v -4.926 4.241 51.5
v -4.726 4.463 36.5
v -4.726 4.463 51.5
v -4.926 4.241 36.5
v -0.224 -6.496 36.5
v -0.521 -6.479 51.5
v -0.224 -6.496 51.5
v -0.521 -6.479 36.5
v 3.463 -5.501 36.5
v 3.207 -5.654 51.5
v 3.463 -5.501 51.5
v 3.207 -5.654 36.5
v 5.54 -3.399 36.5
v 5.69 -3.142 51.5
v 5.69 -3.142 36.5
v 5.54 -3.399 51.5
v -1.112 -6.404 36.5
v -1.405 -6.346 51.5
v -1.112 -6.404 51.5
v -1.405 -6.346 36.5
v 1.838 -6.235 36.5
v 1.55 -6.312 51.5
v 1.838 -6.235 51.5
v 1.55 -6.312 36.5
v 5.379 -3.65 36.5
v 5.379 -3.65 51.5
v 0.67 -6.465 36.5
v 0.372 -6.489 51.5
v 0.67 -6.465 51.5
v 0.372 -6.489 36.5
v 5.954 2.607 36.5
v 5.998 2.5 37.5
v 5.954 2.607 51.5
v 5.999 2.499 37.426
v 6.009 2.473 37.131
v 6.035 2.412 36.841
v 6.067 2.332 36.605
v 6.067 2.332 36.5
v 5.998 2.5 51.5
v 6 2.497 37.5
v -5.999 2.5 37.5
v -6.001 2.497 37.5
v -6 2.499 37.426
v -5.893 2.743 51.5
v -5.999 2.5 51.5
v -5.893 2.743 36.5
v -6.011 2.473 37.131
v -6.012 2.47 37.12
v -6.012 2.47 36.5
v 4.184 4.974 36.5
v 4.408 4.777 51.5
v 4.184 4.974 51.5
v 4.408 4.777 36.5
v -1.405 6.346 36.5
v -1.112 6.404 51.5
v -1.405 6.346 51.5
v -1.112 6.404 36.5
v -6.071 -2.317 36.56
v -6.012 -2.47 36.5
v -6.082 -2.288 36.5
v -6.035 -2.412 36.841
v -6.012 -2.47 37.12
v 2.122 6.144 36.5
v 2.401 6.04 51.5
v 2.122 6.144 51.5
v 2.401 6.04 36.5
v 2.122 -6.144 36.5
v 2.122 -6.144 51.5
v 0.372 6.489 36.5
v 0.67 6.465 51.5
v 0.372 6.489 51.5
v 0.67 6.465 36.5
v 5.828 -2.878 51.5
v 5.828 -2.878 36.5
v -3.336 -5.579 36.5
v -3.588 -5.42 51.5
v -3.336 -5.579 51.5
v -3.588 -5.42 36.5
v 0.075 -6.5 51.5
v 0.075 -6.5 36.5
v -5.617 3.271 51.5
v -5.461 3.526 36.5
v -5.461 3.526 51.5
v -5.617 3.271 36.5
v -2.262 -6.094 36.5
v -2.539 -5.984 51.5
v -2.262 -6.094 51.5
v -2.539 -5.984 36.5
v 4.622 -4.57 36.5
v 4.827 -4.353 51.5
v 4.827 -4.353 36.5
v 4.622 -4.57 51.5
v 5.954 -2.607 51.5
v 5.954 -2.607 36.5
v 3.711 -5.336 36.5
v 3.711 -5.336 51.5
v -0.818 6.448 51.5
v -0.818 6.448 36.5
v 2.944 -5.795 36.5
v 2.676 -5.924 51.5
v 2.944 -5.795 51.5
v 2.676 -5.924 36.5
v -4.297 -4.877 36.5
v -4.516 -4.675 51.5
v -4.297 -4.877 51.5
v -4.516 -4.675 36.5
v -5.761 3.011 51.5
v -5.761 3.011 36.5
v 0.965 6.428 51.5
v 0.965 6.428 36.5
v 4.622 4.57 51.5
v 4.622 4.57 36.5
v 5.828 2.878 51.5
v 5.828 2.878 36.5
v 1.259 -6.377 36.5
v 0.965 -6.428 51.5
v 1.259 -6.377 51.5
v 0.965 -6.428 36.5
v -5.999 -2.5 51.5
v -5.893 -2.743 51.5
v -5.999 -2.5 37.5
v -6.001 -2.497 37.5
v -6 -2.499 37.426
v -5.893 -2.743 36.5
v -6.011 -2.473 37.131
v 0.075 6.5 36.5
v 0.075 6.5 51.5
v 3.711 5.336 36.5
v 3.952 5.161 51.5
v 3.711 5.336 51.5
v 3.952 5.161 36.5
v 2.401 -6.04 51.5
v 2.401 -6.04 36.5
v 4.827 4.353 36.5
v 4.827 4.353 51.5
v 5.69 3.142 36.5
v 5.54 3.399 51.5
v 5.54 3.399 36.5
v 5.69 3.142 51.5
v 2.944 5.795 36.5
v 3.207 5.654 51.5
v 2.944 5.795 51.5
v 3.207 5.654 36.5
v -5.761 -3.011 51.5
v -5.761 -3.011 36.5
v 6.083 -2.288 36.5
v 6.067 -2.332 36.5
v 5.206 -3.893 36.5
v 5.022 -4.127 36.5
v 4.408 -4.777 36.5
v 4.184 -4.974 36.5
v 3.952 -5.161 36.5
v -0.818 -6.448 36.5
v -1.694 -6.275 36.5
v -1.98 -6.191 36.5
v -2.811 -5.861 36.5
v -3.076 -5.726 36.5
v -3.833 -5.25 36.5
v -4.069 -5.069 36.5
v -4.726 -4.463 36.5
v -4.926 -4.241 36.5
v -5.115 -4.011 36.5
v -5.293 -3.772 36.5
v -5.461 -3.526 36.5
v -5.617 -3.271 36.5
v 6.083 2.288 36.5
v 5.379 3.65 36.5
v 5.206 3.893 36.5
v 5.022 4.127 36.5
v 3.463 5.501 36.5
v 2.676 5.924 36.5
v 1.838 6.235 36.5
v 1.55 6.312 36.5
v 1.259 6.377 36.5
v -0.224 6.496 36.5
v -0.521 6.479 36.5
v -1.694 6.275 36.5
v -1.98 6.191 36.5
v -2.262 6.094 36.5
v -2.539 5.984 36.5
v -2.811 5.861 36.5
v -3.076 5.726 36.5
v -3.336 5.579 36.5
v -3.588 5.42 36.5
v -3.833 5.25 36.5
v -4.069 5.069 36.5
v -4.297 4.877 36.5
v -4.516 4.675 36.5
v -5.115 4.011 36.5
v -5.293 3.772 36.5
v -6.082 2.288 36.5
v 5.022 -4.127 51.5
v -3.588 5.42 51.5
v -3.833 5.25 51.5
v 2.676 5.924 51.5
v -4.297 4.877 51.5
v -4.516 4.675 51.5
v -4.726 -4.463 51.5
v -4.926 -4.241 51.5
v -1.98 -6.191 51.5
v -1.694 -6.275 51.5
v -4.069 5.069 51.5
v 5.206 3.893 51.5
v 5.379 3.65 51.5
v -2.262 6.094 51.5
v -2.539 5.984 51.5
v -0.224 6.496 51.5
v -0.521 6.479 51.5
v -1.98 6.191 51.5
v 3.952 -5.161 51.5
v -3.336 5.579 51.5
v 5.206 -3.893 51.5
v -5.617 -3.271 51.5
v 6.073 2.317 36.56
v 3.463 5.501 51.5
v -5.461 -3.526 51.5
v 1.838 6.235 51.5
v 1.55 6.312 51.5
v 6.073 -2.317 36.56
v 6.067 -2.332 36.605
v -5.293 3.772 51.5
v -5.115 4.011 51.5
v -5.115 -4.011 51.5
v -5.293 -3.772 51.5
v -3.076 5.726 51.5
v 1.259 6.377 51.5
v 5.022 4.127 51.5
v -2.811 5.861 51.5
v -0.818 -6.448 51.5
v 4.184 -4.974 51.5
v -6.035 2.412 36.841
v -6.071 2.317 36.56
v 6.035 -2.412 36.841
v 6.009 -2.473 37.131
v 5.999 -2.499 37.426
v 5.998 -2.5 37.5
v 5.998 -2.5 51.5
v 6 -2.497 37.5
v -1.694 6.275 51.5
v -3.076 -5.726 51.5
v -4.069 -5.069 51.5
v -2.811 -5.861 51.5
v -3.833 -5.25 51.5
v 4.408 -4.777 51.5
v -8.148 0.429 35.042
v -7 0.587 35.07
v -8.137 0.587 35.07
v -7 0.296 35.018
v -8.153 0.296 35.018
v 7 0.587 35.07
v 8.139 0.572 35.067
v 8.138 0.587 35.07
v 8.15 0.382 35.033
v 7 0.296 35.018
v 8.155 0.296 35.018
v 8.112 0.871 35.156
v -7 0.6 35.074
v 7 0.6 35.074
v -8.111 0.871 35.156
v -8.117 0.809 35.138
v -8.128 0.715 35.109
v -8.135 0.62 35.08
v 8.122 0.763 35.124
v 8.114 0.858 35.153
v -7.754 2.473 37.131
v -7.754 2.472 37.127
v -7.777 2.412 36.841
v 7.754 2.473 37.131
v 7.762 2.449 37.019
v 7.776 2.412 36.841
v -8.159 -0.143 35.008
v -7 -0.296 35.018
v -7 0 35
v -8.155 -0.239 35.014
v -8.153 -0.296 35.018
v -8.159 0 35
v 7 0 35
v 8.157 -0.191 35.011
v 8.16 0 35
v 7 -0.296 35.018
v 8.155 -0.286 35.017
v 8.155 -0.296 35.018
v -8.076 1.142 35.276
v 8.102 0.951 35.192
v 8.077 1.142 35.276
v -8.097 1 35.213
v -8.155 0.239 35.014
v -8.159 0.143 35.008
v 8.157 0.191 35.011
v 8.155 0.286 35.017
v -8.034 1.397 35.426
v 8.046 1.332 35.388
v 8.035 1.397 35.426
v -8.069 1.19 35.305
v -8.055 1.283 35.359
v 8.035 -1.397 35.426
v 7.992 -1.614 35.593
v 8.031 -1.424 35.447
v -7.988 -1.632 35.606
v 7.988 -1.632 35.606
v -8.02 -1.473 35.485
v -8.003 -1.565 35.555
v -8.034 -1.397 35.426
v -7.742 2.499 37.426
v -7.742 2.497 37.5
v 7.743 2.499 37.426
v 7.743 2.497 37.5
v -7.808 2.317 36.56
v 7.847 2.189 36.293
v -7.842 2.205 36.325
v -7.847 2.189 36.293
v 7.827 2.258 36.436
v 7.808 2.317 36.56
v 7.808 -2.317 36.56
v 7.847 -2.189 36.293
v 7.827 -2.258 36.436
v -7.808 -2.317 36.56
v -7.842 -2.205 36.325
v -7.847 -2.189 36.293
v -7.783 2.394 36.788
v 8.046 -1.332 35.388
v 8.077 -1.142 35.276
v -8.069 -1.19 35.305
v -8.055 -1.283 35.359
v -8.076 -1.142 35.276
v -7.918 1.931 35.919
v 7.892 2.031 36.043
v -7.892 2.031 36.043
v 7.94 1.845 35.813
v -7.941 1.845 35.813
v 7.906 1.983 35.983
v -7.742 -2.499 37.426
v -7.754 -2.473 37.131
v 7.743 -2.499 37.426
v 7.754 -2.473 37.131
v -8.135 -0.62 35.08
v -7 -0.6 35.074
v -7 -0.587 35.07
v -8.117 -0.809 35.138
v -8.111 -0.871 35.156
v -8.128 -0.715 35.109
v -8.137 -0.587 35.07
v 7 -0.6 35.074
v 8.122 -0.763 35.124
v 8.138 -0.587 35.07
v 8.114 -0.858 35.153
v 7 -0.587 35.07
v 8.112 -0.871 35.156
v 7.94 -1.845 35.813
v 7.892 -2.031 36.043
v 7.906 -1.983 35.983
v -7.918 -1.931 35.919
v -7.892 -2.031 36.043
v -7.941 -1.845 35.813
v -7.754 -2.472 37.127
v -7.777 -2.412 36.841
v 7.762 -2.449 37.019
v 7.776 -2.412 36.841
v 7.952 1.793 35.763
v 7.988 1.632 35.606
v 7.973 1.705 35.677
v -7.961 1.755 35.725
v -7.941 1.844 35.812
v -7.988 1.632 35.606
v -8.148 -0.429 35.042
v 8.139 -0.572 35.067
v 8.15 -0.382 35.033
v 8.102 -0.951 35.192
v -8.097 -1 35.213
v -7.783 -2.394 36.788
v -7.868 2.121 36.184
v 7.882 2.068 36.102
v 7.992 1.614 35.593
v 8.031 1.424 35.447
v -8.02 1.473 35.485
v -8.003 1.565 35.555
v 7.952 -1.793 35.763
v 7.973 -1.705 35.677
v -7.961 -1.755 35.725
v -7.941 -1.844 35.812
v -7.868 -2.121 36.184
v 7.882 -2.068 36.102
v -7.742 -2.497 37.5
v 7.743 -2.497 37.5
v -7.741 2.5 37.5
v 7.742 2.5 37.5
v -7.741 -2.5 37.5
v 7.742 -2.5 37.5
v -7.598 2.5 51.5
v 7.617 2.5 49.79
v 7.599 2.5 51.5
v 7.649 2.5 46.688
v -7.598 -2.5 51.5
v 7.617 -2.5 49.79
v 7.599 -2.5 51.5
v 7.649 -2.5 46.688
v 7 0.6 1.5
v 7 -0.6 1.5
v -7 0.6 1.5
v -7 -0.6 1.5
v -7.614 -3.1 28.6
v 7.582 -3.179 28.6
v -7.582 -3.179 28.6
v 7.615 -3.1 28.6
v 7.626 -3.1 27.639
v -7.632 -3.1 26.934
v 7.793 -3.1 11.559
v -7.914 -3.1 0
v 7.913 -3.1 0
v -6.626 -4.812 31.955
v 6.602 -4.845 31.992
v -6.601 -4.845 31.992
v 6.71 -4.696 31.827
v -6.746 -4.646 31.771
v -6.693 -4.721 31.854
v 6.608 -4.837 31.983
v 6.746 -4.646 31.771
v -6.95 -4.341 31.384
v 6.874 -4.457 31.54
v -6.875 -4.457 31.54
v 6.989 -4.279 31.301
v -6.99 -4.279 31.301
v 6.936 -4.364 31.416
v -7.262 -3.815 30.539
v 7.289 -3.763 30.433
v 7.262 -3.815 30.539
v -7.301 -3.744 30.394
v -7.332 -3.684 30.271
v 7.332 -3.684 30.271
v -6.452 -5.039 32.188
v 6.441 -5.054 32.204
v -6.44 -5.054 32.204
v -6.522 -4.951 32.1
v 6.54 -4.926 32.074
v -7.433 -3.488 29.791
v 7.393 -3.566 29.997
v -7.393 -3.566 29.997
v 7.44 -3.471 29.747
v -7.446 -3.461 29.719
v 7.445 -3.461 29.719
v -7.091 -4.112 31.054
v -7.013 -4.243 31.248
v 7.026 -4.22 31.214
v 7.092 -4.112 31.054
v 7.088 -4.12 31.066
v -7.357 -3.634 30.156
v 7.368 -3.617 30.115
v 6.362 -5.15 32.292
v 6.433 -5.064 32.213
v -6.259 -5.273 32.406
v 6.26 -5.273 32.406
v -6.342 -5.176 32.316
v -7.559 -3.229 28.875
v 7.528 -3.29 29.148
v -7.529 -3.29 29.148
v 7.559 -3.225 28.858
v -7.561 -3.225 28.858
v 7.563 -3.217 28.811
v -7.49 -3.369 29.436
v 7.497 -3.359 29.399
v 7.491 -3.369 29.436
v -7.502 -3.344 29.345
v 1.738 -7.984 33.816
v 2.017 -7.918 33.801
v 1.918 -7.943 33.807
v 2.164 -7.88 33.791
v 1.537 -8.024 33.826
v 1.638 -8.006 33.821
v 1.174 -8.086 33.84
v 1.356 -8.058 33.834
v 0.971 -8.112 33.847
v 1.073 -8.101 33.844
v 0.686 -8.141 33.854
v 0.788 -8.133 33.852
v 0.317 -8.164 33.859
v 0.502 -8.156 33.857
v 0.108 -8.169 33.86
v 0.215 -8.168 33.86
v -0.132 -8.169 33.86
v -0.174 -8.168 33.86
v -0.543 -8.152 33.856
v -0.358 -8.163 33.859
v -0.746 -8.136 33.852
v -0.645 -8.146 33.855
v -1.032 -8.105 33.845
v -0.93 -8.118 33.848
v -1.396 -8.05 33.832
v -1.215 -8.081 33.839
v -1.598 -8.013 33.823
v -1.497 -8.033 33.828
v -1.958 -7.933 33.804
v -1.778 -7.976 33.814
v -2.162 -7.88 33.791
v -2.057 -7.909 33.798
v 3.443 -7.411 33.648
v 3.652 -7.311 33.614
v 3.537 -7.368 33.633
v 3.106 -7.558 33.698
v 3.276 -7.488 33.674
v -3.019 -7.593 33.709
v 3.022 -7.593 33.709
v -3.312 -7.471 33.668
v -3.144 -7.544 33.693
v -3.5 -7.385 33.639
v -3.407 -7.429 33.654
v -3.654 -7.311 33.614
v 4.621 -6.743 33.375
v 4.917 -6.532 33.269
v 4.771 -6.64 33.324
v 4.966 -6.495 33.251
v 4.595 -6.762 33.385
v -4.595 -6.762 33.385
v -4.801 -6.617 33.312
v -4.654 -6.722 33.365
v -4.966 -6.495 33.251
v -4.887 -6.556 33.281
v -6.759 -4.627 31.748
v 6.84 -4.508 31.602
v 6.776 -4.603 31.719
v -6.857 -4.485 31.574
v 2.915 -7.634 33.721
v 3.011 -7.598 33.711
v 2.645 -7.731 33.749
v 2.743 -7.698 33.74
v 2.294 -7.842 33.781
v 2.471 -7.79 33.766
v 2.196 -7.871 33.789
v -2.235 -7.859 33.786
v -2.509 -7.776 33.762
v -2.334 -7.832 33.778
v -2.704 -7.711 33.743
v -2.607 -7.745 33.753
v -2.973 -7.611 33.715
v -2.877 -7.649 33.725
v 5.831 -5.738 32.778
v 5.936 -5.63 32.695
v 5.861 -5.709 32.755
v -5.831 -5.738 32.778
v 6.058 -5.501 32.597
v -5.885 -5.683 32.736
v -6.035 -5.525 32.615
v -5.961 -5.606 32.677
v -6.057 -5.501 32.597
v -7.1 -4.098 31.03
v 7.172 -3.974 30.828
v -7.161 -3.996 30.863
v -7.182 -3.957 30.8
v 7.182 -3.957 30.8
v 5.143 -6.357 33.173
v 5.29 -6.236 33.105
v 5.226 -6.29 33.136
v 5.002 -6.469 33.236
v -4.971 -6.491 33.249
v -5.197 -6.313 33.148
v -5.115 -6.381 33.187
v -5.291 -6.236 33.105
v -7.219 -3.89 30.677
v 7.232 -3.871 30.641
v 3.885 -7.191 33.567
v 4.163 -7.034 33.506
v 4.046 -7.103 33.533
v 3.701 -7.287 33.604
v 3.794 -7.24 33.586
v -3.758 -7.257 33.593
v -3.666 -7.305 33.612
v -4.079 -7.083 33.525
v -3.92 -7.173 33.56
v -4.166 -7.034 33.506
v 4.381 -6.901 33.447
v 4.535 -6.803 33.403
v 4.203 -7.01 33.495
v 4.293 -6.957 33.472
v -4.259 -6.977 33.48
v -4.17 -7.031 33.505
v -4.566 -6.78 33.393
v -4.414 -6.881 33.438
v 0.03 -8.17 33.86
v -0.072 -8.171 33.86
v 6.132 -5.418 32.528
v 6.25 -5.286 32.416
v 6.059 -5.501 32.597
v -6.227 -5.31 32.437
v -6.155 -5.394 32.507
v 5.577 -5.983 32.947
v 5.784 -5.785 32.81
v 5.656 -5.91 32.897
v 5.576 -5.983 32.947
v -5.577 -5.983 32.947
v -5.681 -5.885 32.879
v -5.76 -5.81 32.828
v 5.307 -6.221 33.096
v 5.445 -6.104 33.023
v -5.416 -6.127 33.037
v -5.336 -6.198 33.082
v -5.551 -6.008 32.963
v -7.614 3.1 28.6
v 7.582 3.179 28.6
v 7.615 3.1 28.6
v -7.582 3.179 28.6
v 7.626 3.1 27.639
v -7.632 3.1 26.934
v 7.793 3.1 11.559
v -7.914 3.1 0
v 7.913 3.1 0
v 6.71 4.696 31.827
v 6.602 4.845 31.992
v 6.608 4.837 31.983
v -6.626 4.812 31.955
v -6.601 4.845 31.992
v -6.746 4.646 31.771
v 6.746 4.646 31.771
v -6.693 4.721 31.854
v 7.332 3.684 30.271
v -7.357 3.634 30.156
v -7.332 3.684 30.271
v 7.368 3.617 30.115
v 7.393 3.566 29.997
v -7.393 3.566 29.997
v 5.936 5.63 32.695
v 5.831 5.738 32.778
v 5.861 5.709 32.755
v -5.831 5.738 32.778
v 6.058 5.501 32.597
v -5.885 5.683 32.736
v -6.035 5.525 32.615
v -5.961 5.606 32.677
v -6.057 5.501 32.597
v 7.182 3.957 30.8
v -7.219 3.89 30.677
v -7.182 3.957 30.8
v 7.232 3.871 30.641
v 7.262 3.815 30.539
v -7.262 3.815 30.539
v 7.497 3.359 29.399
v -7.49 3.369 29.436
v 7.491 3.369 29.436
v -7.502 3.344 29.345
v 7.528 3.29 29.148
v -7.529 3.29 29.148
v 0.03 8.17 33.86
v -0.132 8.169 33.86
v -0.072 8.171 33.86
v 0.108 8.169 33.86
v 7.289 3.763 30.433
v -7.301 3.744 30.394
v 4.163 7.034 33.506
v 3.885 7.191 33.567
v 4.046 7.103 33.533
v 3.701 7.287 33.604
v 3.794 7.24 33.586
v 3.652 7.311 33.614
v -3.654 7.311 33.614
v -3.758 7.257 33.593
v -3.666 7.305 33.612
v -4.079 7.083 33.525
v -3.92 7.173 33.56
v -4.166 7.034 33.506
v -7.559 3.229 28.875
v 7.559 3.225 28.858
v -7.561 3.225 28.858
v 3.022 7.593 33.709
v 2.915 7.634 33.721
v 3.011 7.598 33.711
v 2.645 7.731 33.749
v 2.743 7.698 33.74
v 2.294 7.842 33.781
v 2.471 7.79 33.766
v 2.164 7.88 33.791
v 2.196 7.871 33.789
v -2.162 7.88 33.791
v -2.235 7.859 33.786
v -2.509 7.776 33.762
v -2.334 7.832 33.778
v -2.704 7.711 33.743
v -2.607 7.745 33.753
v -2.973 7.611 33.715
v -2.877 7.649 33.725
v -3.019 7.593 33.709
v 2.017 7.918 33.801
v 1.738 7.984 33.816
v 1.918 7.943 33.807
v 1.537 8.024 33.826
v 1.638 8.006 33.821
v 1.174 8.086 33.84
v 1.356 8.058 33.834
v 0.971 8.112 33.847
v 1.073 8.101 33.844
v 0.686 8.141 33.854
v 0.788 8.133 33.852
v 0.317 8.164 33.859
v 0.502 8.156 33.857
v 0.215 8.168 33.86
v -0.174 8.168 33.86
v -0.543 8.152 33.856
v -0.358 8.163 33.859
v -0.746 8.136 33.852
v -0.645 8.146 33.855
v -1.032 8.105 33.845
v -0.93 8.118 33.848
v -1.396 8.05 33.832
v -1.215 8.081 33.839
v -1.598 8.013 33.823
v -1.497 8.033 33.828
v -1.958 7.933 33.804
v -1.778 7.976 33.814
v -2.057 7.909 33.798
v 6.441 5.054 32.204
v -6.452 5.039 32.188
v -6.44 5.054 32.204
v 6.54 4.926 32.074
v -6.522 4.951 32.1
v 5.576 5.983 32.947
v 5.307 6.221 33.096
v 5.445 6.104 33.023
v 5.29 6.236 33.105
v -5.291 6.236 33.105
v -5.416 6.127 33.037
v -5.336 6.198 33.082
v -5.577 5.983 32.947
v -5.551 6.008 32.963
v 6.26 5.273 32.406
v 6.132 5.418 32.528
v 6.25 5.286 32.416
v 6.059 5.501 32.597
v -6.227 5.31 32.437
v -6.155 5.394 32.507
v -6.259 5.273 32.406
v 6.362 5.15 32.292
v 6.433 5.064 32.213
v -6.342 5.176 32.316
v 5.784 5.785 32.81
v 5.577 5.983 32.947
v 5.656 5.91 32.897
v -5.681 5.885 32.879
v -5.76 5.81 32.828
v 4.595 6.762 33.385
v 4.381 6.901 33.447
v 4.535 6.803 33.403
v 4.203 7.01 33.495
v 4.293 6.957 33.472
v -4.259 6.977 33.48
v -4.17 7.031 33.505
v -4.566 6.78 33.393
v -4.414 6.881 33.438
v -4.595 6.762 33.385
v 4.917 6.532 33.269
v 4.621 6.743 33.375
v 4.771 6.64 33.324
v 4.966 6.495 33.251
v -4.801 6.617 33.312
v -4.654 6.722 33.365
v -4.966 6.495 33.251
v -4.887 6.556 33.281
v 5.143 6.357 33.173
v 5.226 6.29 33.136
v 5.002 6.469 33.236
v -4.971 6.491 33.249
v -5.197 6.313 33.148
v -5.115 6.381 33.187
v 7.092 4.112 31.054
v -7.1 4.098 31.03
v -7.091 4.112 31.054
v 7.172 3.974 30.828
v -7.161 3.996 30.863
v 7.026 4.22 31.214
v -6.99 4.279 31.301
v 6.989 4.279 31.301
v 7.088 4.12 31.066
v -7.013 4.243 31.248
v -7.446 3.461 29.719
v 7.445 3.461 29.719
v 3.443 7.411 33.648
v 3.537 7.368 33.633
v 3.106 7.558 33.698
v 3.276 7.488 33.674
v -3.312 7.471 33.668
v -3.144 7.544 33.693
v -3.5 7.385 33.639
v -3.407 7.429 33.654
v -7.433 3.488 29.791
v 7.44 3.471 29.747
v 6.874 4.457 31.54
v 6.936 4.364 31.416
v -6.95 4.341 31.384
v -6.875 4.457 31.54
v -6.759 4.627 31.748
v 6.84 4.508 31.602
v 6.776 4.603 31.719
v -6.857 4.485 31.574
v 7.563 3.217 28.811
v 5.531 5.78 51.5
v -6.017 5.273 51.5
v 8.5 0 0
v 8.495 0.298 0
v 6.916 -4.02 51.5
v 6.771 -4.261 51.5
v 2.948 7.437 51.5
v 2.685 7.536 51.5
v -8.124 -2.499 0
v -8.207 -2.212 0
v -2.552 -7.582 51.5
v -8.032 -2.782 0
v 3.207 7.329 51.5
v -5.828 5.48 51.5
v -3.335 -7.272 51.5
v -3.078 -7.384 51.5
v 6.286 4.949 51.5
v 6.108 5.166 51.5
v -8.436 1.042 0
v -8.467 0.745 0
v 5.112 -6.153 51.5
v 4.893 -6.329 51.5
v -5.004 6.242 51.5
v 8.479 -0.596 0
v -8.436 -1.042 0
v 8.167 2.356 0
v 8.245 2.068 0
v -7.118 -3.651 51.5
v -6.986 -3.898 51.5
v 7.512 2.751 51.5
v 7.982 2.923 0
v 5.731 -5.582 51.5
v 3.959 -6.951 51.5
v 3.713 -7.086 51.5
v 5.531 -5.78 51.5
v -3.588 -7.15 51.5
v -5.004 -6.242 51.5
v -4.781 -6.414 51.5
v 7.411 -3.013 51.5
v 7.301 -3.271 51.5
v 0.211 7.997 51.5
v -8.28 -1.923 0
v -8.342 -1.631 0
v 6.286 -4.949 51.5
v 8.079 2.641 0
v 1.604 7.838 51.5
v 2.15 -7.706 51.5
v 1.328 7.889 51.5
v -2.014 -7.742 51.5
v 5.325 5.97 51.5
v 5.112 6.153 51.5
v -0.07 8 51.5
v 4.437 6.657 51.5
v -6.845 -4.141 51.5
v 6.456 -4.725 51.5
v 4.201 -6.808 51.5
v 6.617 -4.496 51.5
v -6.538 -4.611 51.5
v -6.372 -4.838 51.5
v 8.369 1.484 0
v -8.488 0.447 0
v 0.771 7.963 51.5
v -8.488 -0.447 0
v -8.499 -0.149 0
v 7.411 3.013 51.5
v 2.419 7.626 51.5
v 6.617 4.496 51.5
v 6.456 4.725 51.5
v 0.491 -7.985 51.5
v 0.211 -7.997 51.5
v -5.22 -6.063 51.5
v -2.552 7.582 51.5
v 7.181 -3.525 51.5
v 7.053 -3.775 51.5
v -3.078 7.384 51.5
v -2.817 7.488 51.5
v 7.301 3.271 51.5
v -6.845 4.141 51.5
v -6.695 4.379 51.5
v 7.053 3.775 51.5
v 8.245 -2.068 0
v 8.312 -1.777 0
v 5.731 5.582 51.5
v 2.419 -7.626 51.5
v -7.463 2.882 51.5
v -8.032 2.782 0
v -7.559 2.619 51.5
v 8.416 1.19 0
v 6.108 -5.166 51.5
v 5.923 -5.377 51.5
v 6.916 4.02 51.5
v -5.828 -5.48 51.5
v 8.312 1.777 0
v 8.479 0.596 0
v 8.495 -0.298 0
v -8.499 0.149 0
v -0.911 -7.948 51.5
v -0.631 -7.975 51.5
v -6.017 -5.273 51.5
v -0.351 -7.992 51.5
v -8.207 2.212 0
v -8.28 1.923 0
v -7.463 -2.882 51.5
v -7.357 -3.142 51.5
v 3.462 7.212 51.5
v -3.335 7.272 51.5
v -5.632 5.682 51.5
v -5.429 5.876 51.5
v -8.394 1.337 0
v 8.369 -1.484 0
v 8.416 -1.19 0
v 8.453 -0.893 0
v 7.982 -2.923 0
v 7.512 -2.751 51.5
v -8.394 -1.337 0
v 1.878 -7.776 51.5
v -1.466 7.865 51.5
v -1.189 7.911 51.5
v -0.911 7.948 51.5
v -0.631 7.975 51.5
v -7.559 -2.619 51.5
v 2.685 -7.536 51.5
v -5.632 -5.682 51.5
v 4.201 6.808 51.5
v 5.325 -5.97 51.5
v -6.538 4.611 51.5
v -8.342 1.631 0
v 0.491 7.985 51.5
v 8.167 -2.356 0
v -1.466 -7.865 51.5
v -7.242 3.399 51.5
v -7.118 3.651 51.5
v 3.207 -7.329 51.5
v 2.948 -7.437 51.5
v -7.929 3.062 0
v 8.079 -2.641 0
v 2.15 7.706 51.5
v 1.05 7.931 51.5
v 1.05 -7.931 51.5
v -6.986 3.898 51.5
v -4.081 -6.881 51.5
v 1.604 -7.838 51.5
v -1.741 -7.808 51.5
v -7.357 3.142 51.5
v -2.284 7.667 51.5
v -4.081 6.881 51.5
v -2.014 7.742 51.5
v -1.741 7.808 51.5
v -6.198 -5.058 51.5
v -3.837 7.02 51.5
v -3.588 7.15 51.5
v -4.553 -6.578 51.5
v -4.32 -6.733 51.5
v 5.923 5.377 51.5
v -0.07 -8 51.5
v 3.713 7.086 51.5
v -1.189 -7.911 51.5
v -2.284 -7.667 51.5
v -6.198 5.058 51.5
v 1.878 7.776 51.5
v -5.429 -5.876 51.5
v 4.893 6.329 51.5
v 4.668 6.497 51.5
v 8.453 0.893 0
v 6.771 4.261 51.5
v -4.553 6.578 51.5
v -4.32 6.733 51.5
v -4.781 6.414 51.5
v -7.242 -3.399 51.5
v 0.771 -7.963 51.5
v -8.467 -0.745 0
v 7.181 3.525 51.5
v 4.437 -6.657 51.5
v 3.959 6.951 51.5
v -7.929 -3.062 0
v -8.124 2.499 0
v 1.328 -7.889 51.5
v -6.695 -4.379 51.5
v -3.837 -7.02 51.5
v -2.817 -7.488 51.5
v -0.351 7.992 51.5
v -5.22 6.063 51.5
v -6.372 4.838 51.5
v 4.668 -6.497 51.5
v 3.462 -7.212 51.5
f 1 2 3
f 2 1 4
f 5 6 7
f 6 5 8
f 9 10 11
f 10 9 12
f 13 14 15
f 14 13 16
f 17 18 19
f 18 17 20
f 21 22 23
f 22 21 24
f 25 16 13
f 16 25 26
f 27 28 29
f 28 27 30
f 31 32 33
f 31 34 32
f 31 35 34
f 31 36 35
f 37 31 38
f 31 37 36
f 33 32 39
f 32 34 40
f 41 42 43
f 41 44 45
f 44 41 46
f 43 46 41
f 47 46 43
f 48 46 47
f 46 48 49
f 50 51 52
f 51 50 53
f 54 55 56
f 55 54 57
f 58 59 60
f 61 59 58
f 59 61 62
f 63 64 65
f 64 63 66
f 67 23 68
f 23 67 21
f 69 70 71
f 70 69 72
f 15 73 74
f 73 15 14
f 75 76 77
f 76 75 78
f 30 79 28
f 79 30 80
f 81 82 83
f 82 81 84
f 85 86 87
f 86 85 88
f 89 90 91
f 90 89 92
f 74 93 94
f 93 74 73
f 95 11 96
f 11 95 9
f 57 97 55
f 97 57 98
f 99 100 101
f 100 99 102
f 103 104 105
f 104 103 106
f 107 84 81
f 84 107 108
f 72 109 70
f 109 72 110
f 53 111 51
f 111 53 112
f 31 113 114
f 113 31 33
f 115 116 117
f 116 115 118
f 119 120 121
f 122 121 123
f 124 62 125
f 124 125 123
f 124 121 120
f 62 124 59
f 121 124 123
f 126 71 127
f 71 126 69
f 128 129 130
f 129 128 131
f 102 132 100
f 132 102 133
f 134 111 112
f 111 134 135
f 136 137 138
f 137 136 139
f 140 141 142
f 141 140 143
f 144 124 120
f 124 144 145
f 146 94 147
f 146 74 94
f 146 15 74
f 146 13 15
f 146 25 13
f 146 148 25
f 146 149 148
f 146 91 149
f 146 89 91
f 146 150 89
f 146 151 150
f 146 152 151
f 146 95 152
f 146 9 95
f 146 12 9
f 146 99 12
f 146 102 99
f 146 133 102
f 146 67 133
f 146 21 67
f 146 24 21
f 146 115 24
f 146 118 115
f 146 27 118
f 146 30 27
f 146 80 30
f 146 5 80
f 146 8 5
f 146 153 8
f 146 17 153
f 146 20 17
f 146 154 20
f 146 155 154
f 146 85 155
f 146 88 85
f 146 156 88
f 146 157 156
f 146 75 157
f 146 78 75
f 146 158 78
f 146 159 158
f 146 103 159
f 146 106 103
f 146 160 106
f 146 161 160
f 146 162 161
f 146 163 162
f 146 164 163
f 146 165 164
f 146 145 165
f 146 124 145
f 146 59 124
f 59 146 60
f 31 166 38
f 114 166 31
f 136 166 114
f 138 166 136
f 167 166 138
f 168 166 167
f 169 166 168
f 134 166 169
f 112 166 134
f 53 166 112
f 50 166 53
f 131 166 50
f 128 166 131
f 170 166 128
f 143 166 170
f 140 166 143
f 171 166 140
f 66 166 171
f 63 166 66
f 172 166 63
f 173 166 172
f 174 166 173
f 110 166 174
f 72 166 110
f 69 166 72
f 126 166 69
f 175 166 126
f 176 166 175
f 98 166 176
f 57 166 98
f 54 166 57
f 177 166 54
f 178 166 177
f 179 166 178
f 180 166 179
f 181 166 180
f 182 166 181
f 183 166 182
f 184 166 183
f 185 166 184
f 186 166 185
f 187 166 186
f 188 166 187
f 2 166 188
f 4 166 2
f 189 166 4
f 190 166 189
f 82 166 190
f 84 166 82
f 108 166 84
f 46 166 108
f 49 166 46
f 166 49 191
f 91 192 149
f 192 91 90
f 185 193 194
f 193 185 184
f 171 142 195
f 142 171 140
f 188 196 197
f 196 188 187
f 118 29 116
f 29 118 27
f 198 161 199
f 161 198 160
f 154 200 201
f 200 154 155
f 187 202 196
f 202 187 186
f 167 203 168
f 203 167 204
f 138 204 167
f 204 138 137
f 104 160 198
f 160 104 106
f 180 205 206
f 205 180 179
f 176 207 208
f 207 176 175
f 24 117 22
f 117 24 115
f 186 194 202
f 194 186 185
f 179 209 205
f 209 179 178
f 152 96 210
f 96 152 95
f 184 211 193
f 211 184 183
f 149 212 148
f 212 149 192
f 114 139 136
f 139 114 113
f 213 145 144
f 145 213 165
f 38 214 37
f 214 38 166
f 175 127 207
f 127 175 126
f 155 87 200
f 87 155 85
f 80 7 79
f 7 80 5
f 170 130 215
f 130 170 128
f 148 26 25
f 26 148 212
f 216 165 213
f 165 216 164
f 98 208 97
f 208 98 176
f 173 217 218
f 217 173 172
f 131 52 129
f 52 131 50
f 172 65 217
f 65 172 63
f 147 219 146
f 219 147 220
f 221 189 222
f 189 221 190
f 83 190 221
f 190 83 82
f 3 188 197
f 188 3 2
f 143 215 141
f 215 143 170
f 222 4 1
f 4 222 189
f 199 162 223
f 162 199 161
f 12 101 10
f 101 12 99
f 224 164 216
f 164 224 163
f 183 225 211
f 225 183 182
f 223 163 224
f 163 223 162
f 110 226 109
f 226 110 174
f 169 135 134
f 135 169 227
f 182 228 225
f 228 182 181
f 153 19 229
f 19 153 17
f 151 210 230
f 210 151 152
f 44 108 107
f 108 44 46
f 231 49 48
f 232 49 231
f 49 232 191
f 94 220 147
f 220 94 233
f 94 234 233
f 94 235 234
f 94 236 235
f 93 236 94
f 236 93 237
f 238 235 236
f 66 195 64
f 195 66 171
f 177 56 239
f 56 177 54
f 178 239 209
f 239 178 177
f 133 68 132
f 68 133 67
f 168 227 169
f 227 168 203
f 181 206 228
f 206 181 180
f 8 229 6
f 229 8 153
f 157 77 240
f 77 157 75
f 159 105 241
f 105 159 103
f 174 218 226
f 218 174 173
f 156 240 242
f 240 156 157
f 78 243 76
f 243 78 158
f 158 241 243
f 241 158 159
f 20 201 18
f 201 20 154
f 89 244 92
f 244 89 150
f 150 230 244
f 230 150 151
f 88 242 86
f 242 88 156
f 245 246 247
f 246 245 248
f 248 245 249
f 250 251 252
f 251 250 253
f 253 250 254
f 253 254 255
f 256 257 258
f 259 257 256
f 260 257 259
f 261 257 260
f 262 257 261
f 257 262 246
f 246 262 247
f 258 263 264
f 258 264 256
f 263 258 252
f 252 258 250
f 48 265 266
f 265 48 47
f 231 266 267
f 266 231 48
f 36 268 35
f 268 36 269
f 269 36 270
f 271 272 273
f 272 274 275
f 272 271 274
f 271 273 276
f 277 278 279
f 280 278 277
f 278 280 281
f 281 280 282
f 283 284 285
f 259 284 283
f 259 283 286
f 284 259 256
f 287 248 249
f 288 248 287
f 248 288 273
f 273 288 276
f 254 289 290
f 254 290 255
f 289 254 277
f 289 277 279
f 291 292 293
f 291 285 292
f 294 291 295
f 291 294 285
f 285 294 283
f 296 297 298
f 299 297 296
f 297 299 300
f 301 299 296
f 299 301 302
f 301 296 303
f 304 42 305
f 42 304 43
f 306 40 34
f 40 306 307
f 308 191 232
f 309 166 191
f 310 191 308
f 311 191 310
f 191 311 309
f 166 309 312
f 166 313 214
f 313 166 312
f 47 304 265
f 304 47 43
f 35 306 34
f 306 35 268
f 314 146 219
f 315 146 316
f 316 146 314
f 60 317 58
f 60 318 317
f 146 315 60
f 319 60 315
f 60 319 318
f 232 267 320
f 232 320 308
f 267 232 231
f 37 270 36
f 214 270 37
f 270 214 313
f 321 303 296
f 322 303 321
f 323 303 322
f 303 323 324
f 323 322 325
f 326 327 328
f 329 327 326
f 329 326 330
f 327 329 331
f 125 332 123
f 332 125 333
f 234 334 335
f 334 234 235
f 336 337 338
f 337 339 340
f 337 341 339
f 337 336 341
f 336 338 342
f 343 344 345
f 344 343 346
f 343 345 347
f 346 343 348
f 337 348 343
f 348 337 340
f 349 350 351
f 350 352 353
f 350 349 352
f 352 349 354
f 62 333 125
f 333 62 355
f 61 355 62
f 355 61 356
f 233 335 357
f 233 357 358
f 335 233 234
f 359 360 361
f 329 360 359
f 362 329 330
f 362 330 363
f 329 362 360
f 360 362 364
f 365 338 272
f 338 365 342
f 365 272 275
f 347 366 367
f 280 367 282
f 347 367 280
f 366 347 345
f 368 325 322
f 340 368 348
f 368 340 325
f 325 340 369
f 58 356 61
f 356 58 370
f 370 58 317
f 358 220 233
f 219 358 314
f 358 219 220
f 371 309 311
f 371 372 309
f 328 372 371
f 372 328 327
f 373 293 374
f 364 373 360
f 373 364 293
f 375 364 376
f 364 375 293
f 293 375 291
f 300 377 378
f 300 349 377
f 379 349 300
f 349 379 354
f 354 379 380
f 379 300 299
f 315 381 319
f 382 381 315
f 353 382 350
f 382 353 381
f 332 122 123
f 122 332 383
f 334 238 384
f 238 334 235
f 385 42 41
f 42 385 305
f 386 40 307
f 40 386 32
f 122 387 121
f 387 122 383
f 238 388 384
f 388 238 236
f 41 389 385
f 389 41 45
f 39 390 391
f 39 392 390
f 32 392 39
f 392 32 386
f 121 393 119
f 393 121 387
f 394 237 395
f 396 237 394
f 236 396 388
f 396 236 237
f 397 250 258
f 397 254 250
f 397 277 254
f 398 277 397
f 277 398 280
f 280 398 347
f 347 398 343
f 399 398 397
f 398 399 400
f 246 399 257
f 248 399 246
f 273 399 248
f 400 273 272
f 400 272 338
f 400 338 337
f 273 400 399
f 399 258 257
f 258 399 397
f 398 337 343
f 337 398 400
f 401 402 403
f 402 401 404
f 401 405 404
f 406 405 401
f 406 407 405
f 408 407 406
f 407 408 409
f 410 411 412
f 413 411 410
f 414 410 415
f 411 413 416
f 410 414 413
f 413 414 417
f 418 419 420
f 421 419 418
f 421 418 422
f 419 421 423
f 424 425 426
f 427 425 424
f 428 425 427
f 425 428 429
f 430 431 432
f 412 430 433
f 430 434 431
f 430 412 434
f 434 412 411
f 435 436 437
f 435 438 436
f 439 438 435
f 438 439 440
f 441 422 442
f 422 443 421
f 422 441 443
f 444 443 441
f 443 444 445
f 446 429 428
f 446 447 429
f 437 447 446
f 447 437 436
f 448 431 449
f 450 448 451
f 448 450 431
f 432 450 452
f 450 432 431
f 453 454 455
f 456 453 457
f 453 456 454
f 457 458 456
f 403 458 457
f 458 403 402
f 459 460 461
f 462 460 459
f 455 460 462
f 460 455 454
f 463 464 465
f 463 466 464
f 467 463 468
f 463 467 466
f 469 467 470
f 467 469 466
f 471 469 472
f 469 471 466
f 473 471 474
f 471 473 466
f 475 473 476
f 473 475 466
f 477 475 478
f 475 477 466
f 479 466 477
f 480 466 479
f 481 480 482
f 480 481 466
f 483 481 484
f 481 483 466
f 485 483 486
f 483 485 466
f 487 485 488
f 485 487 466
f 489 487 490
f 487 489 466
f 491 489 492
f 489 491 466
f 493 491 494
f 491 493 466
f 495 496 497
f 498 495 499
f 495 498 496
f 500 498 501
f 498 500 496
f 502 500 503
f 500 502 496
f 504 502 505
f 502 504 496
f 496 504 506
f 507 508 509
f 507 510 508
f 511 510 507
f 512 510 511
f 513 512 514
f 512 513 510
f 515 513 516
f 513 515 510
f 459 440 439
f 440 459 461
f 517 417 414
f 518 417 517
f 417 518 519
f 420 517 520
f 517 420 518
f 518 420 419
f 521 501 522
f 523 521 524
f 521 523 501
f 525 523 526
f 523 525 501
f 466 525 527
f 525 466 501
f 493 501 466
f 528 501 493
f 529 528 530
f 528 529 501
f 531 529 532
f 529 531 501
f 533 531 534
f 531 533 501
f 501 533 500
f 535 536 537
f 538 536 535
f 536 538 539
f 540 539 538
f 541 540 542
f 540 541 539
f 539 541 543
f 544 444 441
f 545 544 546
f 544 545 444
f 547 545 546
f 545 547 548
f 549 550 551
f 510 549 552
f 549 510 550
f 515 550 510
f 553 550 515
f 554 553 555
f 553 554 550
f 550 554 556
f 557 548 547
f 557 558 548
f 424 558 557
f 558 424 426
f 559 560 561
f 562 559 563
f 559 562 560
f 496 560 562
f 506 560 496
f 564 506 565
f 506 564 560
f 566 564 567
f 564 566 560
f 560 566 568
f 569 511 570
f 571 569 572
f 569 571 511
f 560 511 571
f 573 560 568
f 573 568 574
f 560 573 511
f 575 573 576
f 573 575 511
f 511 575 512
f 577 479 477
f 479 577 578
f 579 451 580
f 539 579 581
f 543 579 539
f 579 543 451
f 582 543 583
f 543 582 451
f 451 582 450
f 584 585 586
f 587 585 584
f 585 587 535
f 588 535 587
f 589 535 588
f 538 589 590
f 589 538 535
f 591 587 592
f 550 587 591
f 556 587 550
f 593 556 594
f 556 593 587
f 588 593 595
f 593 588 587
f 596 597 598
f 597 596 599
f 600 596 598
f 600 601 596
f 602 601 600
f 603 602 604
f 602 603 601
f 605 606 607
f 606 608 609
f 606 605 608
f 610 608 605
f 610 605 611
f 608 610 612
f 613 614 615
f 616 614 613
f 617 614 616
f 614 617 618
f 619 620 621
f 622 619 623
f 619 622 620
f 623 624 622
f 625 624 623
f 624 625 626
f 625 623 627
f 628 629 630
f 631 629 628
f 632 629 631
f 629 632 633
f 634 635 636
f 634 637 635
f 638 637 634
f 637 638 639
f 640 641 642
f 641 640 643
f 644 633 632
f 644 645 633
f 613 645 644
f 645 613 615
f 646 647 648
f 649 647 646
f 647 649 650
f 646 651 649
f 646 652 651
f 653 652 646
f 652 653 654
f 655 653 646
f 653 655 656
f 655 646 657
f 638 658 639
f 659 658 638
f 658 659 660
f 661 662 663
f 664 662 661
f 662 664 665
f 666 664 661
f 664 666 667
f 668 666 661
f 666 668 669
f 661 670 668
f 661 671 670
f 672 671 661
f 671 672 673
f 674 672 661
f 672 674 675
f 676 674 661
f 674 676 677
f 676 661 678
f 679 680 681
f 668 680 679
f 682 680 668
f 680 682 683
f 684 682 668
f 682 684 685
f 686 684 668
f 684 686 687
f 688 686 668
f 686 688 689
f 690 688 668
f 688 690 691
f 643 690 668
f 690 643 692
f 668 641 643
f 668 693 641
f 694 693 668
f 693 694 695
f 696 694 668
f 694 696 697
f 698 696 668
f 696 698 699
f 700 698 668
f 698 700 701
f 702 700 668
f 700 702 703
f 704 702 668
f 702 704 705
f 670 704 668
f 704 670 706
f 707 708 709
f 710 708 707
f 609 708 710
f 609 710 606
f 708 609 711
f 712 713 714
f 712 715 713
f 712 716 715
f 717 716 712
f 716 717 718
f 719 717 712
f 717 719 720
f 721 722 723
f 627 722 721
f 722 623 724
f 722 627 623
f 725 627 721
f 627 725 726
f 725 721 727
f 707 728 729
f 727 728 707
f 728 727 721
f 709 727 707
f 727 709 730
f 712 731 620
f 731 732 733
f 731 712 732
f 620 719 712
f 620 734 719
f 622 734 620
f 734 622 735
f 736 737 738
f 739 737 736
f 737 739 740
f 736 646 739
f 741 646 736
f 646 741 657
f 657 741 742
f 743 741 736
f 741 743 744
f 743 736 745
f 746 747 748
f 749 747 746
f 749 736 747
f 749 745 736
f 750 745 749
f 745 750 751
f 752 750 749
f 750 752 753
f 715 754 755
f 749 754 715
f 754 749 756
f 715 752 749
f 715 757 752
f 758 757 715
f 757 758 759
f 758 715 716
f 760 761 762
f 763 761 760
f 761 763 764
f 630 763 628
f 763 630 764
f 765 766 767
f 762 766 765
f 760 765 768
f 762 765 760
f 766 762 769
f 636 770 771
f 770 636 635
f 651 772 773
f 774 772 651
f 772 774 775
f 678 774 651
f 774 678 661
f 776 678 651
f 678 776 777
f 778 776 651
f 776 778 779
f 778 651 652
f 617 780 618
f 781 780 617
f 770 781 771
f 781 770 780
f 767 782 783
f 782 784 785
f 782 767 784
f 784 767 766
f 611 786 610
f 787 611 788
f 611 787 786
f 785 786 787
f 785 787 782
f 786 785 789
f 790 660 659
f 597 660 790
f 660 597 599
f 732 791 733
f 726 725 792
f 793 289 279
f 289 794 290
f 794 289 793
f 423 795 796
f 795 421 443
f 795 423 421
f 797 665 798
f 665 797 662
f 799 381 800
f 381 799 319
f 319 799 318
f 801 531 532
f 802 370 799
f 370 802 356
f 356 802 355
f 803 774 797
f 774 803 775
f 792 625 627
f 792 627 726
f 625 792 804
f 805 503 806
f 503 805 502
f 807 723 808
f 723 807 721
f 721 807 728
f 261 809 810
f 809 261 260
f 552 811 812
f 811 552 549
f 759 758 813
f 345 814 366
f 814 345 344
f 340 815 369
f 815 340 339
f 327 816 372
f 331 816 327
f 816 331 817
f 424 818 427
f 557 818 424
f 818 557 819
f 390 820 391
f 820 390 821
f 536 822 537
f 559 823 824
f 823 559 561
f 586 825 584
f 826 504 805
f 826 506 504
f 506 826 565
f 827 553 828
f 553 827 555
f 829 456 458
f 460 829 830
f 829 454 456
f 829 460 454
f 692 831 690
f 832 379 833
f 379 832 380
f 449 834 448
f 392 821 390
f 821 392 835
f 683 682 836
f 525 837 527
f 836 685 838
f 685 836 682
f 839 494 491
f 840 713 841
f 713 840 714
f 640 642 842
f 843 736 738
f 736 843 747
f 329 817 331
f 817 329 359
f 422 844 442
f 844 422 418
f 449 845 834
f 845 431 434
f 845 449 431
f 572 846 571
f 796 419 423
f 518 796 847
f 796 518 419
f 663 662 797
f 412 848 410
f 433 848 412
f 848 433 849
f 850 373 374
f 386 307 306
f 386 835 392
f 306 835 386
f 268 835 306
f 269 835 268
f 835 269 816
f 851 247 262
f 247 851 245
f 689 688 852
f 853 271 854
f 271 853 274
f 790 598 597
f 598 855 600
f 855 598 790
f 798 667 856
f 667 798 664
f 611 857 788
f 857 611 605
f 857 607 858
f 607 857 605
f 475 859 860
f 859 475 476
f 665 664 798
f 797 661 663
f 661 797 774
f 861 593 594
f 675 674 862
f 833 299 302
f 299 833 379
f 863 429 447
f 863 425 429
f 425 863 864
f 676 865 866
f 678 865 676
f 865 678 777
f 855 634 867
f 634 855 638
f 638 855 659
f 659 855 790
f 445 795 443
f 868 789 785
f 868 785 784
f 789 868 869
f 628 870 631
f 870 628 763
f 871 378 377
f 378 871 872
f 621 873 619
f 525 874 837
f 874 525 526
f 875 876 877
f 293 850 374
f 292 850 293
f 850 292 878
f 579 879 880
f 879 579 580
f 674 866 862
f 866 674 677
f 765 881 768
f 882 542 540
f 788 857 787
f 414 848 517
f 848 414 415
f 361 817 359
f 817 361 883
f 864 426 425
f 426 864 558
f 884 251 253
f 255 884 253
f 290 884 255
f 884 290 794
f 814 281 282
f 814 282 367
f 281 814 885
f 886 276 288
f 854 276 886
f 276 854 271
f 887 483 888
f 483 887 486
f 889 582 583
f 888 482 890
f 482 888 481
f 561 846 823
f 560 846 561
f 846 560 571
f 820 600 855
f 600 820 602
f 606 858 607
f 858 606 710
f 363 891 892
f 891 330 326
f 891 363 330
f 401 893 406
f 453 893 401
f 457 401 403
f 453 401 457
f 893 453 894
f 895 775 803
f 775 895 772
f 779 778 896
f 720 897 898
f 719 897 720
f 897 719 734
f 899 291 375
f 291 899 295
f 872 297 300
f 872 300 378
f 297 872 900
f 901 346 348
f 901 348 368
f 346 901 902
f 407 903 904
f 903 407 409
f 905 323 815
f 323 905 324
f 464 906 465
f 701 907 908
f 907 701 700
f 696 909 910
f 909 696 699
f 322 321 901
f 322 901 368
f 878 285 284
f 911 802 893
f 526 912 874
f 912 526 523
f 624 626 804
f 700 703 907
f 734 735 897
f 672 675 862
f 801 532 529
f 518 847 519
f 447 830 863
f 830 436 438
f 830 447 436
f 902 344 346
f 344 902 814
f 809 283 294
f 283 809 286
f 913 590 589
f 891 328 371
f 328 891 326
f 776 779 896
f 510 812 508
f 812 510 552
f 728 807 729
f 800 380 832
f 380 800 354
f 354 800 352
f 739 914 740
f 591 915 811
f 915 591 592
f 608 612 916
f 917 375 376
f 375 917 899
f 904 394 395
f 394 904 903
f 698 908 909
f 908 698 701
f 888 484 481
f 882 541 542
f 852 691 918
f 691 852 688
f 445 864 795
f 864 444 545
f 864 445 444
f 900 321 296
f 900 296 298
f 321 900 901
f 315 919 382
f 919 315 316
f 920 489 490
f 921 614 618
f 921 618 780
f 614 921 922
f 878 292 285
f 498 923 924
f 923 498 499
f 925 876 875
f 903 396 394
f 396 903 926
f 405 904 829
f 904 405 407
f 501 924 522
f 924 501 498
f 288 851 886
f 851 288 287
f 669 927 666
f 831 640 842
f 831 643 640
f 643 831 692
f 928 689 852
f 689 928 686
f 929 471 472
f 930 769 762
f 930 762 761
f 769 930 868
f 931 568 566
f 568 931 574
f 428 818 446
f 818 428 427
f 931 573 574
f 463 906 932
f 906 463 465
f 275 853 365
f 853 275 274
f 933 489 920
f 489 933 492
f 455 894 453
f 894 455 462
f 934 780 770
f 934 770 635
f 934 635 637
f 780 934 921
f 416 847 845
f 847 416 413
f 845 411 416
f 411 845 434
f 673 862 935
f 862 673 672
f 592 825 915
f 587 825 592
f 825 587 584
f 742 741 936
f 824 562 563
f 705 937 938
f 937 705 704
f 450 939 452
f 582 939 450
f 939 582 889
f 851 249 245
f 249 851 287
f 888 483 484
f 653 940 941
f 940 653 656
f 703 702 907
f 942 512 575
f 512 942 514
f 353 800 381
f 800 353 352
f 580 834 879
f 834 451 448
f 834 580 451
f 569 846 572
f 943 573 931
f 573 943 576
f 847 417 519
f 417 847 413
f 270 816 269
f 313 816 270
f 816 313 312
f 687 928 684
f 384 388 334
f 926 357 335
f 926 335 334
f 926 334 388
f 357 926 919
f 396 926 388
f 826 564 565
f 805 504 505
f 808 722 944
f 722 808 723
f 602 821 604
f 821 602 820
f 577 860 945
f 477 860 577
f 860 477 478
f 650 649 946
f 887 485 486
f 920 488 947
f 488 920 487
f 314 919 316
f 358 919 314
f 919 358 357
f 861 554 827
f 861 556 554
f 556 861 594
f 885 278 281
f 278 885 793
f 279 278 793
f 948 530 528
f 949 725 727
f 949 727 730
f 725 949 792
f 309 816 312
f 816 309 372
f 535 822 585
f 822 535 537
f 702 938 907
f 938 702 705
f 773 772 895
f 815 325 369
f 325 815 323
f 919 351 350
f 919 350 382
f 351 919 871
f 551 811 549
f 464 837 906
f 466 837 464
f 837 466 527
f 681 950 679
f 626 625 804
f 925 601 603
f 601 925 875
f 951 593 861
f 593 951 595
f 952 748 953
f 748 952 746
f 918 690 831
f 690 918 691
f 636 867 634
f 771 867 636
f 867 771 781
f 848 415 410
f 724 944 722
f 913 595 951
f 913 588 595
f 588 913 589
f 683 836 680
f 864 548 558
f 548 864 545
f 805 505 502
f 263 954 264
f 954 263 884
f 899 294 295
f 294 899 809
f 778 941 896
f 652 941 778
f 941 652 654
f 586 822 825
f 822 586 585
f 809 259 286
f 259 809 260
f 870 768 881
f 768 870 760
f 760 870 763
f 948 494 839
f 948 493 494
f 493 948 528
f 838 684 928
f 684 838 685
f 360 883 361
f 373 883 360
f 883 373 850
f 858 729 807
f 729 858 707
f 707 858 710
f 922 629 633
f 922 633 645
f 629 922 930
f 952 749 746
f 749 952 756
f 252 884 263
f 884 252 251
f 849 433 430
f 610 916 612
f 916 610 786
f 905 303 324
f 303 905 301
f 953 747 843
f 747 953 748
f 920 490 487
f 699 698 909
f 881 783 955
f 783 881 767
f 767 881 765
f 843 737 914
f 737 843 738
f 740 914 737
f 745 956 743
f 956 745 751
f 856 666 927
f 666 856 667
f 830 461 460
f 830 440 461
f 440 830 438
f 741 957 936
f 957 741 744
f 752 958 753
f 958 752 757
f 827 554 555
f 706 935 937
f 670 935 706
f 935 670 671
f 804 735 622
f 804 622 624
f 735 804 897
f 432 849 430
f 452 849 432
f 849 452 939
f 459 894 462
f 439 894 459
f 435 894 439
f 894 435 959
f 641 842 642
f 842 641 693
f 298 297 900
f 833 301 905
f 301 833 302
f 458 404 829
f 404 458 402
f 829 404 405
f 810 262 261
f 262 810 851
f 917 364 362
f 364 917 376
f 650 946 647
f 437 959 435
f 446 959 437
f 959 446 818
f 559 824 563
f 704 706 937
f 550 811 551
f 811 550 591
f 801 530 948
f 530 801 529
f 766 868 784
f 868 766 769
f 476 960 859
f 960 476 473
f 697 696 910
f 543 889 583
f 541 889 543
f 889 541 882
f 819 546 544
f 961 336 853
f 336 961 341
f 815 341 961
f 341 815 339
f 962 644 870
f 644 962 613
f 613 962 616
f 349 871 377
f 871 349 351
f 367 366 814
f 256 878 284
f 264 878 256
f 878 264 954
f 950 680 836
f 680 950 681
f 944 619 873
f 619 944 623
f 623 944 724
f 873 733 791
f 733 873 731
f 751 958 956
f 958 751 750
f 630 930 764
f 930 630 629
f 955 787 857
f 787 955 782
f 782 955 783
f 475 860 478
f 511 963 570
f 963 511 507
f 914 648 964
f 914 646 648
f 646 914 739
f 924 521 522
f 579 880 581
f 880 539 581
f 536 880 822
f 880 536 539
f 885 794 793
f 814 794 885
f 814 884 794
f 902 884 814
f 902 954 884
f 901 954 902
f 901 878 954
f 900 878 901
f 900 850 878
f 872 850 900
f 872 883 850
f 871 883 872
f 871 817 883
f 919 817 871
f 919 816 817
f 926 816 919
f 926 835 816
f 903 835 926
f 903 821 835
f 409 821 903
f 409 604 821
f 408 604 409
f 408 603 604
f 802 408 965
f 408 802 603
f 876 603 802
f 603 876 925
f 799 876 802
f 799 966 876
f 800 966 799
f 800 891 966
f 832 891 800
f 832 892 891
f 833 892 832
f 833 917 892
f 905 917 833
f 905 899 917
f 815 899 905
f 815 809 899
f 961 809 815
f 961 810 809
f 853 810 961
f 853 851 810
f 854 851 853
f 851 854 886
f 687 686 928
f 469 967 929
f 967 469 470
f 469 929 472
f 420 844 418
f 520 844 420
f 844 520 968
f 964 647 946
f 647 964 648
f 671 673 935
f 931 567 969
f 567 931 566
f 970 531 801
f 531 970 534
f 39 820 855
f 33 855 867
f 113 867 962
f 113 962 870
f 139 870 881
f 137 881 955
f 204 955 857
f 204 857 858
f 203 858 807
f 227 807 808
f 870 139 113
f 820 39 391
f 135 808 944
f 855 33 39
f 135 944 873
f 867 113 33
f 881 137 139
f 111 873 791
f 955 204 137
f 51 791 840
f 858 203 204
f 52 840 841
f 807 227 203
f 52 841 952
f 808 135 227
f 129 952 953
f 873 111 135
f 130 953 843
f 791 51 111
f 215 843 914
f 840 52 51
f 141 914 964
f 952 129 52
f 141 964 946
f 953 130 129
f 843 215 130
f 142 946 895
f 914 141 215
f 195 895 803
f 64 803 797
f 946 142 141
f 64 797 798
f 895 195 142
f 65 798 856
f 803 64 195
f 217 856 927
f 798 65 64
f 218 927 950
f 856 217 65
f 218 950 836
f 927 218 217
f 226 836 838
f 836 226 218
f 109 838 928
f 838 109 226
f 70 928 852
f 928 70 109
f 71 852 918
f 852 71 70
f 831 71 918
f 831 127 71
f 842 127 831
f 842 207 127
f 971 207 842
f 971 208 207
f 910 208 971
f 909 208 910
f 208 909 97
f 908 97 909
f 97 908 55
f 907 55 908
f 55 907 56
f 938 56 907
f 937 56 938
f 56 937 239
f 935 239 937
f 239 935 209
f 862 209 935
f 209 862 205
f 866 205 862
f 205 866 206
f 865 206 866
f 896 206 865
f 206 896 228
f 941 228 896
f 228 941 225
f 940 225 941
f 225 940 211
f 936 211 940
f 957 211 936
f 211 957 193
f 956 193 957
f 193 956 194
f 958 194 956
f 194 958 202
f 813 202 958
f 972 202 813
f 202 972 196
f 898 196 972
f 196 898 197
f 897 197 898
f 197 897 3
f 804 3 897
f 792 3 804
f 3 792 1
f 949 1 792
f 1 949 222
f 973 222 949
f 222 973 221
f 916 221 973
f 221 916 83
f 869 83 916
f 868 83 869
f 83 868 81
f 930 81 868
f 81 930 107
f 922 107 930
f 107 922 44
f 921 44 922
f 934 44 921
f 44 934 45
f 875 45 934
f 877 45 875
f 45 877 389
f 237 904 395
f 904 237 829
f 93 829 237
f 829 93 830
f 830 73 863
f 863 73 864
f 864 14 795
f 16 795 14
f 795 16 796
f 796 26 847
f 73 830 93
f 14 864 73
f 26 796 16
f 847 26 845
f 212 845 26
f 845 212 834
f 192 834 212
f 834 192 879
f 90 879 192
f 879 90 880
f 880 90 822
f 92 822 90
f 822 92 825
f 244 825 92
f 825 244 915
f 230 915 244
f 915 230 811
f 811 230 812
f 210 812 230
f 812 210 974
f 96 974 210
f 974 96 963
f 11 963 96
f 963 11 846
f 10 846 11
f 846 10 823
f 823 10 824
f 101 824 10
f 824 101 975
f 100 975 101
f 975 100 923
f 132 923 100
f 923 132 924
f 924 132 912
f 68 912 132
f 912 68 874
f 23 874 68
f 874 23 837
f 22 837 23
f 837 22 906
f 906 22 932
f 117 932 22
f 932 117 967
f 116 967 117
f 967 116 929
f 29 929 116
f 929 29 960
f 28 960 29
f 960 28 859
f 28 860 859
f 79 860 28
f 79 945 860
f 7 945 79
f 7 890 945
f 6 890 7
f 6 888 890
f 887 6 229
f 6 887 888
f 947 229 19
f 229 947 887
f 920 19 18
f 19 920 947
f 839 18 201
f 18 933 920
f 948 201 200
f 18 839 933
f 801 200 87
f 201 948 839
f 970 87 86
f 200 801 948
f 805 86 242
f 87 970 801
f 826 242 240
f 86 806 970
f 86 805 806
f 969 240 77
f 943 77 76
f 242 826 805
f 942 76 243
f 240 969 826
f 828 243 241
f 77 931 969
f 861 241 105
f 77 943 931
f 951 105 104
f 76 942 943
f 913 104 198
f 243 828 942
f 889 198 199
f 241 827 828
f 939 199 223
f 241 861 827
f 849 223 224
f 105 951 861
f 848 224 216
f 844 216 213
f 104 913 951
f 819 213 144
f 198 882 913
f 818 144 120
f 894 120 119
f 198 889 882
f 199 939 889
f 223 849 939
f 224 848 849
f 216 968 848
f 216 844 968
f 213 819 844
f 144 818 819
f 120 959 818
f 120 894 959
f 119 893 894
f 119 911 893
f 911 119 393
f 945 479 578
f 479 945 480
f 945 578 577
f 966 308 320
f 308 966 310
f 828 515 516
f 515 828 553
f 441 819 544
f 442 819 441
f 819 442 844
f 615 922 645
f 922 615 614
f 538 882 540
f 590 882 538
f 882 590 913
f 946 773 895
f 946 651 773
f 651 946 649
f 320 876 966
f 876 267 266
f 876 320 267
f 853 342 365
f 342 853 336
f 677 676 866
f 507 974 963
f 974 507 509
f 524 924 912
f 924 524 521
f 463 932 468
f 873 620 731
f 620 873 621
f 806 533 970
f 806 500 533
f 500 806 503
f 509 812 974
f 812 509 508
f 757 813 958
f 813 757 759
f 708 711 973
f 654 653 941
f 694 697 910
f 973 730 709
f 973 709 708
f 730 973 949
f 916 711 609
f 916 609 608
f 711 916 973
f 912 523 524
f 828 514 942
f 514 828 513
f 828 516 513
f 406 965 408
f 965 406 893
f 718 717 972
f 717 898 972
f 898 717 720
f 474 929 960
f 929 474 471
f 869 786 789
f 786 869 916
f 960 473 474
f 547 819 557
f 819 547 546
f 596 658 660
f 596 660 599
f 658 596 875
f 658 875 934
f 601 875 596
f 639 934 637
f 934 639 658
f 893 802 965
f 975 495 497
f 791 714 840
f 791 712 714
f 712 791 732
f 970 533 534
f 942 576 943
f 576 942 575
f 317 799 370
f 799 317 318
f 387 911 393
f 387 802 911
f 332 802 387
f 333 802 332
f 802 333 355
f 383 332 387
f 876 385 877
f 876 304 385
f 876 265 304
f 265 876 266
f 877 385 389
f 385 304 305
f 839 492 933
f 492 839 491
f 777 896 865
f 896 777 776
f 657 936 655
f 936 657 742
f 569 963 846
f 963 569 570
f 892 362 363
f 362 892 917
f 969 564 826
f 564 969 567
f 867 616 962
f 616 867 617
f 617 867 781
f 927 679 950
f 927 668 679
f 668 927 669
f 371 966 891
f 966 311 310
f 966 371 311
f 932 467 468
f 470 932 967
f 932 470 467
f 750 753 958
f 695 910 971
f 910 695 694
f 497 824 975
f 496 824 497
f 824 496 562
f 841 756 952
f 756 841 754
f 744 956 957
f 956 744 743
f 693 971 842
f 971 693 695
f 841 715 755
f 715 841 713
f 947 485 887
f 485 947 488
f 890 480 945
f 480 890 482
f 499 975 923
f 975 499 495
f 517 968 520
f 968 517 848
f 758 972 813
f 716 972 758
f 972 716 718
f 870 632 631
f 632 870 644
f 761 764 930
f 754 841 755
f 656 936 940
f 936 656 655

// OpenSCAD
// All values in MM.
// preview[view:south, tilt:top]

// this is the skirt covering the locking knurl
innerDiameter=13;			

// how far over the locking knurl should it extend
innerDepth=15;	

// side wall thickness of the skirt			
wallThickness=1.5; 

// wide enough to accomodate your widest blade		
bladeSlotWidth=14;		

// blade thickness
bladeSlotThickness=1.2;	

// deep enough for the longest blade
bladeSlotDepth=35;	

// 0.1 min , the lower the #, the more segments in circles.
smoothness=0.3; 

// width of the gap in the skirt over the knurl          
gap=5;	

// 1 = trim blade end, 0 = leave round					
trimBlade=1;

				
// ** no changes below this line **

height= innerDepth + bladeSlotDepth + wallThickness;
outterDiameter = innerDiameter + ( 2 * wallThickness );

bottomDiameter = bladeSlotWidth + ( 2 * wallThickness );

if( bottomDiameter <= outterDiameter ){
	//echo("bottom less than outer");
	main(outterDiameter,outterDiameter);
} else if ( bottomDiameter > outterDiameter ){
	//echo("bottom greater than outter");
	main(bottomDiameter,bottomDiameter);
}


module main (slotWidth,bottomDiameter) {
	//echo("bottomDiameter = ", bottomDiameter);
	//echo("outterDiameter = ", outterDiameter);
	//echo("slotWidth = ", slotWidth);

difference() {
	// Generate the main cylindar first
	cylinder(h = height, r1 = bottomDiameter/2, r2 = outterDiameter/2, center = false, $fa = 1, $fs = smoothness);
	union () {

		// Cutout for the locking knurl
		translate([0,0,height - innerDepth])
		cylinder (h = innerDepth+1, r = innerDiameter/2, center = false, $fa = 1, $fs = smoothness);

		// cutout the round at the bottom of the slot
		translate([-((slotWidth/2)+1),0,height - innerDepth+1]) 
			rotate([0,90,0]) 
				cylinder (h = slotWidth + 2, r = gap/2, center = false, $fa = 1, $fs = smoothness);

		// cutout the slot
		translate([-((slotWidth/2)+1),-(gap/2),height+1]) 
			rotate([0,90,0]) 
				cube(size = [innerDepth,gap,slotWidth+2], center = false);

		// cutout the blade slot
		translate([-(bladeSlotWidth/2),-(bladeSlotThickness/2),wallThickness])
		cube(size = [bladeSlotWidth,bladeSlotThickness,bladeSlotDepth], center = false);
	}
		// trim the blade end
		if ( trimBlade == 1 ) {
		trim_blade(((bottomDiameter - bladeSlotThickness -(2*wallThickness))/2)-1,(bladeSlotDepth-(bottomDiameter - bladeSlotThickness -(2*wallThickness))/2),bottomDiameter);
		}
} 
}

module trim_blade(trimDepth,trimHeight,bottomDiameter){
	//echo("trimDepth = ", trimDepth);
	//echo("trimHeight = ", trimHeight);
	//echo("bottomDiameter = ", bottomDiameter);
	//echo("outterDiameter = ", outterDiameter);

	difference(){
		union(){
		translate([-(bottomDiameter/2),-(bottomDiameter/2),-1]) 
			cube(size = [bottomDiameter, trimDepth,trimHeight+1], center = false);
		translate([-(bottomDiameter/2),-(bottomDiameter/2)-1,trimHeight-1])
			rotate([0,90,0]) 	
			cylinder (h = bottomDiameter, r = trimDepth+1, center = false, $fa = 1, $fs = smoothness);
		translate([-(bottomDiameter/2),(bottomDiameter/2)-trimDepth,-1]) 
			cube(size = [bottomDiameter, trimDepth,trimHeight+1], center = false);
		translate([-(bottomDiameter/2),(bottomDiameter/2+1),trimHeight-1])
			rotate([0,90,0]) 	
			cylinder (h = bottomDiameter, r = trimDepth+1, center = false, $fa = 1, $fs = smoothness);
		}
	}
}
